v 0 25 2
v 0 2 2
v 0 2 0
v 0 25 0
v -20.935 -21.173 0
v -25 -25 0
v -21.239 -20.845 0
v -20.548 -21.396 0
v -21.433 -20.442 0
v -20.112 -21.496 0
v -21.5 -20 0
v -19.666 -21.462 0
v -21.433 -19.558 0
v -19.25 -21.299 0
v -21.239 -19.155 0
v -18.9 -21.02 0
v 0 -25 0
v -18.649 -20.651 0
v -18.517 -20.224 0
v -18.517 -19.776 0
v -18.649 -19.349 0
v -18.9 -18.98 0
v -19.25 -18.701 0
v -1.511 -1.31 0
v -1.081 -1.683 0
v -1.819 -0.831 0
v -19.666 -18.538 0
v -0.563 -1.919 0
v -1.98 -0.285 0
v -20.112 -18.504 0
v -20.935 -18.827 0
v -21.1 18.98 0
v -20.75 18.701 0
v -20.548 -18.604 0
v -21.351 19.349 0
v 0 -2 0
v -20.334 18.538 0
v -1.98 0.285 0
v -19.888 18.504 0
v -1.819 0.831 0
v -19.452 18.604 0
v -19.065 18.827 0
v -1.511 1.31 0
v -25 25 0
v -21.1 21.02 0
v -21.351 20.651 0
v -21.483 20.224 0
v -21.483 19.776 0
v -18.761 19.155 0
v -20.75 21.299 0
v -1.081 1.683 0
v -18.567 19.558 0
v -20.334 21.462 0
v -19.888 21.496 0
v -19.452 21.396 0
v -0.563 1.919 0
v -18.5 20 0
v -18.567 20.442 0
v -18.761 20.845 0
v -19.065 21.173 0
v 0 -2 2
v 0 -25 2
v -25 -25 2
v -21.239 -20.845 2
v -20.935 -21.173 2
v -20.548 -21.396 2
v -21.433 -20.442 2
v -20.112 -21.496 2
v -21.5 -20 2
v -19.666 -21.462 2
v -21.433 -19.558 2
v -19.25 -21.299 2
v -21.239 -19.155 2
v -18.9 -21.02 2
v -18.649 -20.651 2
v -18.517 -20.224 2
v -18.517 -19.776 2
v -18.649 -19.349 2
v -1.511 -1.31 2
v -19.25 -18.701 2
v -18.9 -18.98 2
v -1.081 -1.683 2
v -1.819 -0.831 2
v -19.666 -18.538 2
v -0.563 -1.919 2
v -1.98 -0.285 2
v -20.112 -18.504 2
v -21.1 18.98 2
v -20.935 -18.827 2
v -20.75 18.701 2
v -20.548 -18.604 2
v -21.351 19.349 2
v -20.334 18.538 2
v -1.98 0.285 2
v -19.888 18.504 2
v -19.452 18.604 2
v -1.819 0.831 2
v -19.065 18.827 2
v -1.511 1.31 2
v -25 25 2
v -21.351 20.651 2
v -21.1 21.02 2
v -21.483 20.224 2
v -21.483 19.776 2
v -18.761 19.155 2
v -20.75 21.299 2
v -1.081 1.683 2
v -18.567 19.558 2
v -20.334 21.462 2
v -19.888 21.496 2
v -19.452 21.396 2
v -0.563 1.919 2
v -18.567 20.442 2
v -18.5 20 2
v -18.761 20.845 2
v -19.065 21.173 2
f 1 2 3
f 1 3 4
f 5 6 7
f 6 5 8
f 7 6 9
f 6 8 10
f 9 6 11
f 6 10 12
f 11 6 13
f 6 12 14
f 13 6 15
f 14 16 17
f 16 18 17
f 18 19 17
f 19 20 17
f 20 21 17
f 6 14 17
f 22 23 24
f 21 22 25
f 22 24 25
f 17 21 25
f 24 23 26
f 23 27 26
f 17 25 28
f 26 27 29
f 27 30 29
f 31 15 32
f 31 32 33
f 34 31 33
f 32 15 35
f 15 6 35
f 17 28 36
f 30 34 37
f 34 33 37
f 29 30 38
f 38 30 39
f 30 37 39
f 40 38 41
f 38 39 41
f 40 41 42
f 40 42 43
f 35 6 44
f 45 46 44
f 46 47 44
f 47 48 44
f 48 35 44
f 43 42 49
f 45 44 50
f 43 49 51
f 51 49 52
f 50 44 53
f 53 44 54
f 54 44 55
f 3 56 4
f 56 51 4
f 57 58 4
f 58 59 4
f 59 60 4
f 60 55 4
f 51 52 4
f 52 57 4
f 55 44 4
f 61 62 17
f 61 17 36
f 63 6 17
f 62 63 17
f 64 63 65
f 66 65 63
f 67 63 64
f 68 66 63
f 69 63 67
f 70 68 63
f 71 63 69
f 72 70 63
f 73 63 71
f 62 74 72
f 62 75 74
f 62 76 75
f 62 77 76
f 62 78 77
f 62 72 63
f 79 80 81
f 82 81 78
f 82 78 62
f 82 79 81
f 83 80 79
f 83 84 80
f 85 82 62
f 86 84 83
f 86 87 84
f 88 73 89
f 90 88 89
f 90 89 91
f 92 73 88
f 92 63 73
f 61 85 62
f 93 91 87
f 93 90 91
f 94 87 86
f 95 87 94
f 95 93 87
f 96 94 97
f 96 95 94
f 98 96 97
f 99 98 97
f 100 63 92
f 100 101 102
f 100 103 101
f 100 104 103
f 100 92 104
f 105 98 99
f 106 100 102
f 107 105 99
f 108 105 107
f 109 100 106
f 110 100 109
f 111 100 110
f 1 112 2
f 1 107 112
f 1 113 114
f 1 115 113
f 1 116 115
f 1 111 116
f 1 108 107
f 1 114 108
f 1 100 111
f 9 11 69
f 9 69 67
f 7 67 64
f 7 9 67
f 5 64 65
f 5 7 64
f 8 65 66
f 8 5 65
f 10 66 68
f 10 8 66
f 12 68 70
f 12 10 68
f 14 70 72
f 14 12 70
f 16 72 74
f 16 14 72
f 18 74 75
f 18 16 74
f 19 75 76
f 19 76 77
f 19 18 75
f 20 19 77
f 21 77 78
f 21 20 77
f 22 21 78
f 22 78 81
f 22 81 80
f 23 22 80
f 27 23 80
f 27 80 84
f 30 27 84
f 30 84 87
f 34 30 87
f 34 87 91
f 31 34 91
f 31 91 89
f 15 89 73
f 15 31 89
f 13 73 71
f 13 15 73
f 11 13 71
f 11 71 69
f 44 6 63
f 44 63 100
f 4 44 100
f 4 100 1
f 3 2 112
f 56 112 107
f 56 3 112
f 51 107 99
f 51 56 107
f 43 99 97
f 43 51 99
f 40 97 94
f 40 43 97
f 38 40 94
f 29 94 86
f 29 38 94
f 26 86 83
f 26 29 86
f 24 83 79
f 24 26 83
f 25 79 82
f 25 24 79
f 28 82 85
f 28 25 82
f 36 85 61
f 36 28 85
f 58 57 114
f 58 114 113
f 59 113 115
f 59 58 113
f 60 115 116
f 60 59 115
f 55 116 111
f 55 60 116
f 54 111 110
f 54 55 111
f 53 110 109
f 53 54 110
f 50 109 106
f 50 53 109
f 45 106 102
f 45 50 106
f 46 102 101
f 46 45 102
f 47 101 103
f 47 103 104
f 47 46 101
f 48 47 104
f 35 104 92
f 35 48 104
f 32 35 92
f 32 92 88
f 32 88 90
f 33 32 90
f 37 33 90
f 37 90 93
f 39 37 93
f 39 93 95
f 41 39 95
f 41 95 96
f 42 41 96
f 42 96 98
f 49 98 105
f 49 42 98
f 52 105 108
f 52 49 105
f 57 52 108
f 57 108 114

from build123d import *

# Parameters (mm, degrees)
SKETCH_1_W          = 50
SKETCH_1_H          = 50
SKETCH_1_R          = 2
SKETCH_1_R_2        = 1.5
EXTRUDE_1_DEPTH     = 2
SKETCH_3_W          = 33.603167957
SKETCH_3_H          = 55.181672871
CUT_EXTRUDE_2_DEPTH = 10


with BuildPart() as part:
    # 草图1 → 凸台-拉伸1 (new body)
    with BuildSketch(Plane.XY):
        Rectangle(SKETCH_1_W, SKETCH_1_H)
        Circle(SKETCH_1_R, mode=Mode.SUBTRACT)
        with Locations((-20, 20)):
            Circle(SKETCH_1_R_2, mode=Mode.SUBTRACT)
        with Locations(Location((20, 20, 0), (0, 0, 180))):
            Circle(SKETCH_1_R_2, mode=Mode.SUBTRACT)
        with Locations((20, -20)):
            Circle(SKETCH_1_R_2, mode=Mode.SUBTRACT)
        with Locations(Location((-20, -20, 0), (0, 0, 180))):
            Circle(SKETCH_1_R_2, mode=Mode.SUBTRACT)
    extrude(amount=EXTRUDE_1_DEPTH)

    # 草图3 → 切除-拉伸2 (cut)
    with BuildSketch(Plane.XY.offset(2)):
        with Locations((16.801583979, -0.050186901)):
            Rectangle(SKETCH_3_W, SKETCH_3_H)
    extrude(amount=-CUT_EXTRUDE_2_DEPTH, mode=Mode.SUBTRACT)


solid = part.part
